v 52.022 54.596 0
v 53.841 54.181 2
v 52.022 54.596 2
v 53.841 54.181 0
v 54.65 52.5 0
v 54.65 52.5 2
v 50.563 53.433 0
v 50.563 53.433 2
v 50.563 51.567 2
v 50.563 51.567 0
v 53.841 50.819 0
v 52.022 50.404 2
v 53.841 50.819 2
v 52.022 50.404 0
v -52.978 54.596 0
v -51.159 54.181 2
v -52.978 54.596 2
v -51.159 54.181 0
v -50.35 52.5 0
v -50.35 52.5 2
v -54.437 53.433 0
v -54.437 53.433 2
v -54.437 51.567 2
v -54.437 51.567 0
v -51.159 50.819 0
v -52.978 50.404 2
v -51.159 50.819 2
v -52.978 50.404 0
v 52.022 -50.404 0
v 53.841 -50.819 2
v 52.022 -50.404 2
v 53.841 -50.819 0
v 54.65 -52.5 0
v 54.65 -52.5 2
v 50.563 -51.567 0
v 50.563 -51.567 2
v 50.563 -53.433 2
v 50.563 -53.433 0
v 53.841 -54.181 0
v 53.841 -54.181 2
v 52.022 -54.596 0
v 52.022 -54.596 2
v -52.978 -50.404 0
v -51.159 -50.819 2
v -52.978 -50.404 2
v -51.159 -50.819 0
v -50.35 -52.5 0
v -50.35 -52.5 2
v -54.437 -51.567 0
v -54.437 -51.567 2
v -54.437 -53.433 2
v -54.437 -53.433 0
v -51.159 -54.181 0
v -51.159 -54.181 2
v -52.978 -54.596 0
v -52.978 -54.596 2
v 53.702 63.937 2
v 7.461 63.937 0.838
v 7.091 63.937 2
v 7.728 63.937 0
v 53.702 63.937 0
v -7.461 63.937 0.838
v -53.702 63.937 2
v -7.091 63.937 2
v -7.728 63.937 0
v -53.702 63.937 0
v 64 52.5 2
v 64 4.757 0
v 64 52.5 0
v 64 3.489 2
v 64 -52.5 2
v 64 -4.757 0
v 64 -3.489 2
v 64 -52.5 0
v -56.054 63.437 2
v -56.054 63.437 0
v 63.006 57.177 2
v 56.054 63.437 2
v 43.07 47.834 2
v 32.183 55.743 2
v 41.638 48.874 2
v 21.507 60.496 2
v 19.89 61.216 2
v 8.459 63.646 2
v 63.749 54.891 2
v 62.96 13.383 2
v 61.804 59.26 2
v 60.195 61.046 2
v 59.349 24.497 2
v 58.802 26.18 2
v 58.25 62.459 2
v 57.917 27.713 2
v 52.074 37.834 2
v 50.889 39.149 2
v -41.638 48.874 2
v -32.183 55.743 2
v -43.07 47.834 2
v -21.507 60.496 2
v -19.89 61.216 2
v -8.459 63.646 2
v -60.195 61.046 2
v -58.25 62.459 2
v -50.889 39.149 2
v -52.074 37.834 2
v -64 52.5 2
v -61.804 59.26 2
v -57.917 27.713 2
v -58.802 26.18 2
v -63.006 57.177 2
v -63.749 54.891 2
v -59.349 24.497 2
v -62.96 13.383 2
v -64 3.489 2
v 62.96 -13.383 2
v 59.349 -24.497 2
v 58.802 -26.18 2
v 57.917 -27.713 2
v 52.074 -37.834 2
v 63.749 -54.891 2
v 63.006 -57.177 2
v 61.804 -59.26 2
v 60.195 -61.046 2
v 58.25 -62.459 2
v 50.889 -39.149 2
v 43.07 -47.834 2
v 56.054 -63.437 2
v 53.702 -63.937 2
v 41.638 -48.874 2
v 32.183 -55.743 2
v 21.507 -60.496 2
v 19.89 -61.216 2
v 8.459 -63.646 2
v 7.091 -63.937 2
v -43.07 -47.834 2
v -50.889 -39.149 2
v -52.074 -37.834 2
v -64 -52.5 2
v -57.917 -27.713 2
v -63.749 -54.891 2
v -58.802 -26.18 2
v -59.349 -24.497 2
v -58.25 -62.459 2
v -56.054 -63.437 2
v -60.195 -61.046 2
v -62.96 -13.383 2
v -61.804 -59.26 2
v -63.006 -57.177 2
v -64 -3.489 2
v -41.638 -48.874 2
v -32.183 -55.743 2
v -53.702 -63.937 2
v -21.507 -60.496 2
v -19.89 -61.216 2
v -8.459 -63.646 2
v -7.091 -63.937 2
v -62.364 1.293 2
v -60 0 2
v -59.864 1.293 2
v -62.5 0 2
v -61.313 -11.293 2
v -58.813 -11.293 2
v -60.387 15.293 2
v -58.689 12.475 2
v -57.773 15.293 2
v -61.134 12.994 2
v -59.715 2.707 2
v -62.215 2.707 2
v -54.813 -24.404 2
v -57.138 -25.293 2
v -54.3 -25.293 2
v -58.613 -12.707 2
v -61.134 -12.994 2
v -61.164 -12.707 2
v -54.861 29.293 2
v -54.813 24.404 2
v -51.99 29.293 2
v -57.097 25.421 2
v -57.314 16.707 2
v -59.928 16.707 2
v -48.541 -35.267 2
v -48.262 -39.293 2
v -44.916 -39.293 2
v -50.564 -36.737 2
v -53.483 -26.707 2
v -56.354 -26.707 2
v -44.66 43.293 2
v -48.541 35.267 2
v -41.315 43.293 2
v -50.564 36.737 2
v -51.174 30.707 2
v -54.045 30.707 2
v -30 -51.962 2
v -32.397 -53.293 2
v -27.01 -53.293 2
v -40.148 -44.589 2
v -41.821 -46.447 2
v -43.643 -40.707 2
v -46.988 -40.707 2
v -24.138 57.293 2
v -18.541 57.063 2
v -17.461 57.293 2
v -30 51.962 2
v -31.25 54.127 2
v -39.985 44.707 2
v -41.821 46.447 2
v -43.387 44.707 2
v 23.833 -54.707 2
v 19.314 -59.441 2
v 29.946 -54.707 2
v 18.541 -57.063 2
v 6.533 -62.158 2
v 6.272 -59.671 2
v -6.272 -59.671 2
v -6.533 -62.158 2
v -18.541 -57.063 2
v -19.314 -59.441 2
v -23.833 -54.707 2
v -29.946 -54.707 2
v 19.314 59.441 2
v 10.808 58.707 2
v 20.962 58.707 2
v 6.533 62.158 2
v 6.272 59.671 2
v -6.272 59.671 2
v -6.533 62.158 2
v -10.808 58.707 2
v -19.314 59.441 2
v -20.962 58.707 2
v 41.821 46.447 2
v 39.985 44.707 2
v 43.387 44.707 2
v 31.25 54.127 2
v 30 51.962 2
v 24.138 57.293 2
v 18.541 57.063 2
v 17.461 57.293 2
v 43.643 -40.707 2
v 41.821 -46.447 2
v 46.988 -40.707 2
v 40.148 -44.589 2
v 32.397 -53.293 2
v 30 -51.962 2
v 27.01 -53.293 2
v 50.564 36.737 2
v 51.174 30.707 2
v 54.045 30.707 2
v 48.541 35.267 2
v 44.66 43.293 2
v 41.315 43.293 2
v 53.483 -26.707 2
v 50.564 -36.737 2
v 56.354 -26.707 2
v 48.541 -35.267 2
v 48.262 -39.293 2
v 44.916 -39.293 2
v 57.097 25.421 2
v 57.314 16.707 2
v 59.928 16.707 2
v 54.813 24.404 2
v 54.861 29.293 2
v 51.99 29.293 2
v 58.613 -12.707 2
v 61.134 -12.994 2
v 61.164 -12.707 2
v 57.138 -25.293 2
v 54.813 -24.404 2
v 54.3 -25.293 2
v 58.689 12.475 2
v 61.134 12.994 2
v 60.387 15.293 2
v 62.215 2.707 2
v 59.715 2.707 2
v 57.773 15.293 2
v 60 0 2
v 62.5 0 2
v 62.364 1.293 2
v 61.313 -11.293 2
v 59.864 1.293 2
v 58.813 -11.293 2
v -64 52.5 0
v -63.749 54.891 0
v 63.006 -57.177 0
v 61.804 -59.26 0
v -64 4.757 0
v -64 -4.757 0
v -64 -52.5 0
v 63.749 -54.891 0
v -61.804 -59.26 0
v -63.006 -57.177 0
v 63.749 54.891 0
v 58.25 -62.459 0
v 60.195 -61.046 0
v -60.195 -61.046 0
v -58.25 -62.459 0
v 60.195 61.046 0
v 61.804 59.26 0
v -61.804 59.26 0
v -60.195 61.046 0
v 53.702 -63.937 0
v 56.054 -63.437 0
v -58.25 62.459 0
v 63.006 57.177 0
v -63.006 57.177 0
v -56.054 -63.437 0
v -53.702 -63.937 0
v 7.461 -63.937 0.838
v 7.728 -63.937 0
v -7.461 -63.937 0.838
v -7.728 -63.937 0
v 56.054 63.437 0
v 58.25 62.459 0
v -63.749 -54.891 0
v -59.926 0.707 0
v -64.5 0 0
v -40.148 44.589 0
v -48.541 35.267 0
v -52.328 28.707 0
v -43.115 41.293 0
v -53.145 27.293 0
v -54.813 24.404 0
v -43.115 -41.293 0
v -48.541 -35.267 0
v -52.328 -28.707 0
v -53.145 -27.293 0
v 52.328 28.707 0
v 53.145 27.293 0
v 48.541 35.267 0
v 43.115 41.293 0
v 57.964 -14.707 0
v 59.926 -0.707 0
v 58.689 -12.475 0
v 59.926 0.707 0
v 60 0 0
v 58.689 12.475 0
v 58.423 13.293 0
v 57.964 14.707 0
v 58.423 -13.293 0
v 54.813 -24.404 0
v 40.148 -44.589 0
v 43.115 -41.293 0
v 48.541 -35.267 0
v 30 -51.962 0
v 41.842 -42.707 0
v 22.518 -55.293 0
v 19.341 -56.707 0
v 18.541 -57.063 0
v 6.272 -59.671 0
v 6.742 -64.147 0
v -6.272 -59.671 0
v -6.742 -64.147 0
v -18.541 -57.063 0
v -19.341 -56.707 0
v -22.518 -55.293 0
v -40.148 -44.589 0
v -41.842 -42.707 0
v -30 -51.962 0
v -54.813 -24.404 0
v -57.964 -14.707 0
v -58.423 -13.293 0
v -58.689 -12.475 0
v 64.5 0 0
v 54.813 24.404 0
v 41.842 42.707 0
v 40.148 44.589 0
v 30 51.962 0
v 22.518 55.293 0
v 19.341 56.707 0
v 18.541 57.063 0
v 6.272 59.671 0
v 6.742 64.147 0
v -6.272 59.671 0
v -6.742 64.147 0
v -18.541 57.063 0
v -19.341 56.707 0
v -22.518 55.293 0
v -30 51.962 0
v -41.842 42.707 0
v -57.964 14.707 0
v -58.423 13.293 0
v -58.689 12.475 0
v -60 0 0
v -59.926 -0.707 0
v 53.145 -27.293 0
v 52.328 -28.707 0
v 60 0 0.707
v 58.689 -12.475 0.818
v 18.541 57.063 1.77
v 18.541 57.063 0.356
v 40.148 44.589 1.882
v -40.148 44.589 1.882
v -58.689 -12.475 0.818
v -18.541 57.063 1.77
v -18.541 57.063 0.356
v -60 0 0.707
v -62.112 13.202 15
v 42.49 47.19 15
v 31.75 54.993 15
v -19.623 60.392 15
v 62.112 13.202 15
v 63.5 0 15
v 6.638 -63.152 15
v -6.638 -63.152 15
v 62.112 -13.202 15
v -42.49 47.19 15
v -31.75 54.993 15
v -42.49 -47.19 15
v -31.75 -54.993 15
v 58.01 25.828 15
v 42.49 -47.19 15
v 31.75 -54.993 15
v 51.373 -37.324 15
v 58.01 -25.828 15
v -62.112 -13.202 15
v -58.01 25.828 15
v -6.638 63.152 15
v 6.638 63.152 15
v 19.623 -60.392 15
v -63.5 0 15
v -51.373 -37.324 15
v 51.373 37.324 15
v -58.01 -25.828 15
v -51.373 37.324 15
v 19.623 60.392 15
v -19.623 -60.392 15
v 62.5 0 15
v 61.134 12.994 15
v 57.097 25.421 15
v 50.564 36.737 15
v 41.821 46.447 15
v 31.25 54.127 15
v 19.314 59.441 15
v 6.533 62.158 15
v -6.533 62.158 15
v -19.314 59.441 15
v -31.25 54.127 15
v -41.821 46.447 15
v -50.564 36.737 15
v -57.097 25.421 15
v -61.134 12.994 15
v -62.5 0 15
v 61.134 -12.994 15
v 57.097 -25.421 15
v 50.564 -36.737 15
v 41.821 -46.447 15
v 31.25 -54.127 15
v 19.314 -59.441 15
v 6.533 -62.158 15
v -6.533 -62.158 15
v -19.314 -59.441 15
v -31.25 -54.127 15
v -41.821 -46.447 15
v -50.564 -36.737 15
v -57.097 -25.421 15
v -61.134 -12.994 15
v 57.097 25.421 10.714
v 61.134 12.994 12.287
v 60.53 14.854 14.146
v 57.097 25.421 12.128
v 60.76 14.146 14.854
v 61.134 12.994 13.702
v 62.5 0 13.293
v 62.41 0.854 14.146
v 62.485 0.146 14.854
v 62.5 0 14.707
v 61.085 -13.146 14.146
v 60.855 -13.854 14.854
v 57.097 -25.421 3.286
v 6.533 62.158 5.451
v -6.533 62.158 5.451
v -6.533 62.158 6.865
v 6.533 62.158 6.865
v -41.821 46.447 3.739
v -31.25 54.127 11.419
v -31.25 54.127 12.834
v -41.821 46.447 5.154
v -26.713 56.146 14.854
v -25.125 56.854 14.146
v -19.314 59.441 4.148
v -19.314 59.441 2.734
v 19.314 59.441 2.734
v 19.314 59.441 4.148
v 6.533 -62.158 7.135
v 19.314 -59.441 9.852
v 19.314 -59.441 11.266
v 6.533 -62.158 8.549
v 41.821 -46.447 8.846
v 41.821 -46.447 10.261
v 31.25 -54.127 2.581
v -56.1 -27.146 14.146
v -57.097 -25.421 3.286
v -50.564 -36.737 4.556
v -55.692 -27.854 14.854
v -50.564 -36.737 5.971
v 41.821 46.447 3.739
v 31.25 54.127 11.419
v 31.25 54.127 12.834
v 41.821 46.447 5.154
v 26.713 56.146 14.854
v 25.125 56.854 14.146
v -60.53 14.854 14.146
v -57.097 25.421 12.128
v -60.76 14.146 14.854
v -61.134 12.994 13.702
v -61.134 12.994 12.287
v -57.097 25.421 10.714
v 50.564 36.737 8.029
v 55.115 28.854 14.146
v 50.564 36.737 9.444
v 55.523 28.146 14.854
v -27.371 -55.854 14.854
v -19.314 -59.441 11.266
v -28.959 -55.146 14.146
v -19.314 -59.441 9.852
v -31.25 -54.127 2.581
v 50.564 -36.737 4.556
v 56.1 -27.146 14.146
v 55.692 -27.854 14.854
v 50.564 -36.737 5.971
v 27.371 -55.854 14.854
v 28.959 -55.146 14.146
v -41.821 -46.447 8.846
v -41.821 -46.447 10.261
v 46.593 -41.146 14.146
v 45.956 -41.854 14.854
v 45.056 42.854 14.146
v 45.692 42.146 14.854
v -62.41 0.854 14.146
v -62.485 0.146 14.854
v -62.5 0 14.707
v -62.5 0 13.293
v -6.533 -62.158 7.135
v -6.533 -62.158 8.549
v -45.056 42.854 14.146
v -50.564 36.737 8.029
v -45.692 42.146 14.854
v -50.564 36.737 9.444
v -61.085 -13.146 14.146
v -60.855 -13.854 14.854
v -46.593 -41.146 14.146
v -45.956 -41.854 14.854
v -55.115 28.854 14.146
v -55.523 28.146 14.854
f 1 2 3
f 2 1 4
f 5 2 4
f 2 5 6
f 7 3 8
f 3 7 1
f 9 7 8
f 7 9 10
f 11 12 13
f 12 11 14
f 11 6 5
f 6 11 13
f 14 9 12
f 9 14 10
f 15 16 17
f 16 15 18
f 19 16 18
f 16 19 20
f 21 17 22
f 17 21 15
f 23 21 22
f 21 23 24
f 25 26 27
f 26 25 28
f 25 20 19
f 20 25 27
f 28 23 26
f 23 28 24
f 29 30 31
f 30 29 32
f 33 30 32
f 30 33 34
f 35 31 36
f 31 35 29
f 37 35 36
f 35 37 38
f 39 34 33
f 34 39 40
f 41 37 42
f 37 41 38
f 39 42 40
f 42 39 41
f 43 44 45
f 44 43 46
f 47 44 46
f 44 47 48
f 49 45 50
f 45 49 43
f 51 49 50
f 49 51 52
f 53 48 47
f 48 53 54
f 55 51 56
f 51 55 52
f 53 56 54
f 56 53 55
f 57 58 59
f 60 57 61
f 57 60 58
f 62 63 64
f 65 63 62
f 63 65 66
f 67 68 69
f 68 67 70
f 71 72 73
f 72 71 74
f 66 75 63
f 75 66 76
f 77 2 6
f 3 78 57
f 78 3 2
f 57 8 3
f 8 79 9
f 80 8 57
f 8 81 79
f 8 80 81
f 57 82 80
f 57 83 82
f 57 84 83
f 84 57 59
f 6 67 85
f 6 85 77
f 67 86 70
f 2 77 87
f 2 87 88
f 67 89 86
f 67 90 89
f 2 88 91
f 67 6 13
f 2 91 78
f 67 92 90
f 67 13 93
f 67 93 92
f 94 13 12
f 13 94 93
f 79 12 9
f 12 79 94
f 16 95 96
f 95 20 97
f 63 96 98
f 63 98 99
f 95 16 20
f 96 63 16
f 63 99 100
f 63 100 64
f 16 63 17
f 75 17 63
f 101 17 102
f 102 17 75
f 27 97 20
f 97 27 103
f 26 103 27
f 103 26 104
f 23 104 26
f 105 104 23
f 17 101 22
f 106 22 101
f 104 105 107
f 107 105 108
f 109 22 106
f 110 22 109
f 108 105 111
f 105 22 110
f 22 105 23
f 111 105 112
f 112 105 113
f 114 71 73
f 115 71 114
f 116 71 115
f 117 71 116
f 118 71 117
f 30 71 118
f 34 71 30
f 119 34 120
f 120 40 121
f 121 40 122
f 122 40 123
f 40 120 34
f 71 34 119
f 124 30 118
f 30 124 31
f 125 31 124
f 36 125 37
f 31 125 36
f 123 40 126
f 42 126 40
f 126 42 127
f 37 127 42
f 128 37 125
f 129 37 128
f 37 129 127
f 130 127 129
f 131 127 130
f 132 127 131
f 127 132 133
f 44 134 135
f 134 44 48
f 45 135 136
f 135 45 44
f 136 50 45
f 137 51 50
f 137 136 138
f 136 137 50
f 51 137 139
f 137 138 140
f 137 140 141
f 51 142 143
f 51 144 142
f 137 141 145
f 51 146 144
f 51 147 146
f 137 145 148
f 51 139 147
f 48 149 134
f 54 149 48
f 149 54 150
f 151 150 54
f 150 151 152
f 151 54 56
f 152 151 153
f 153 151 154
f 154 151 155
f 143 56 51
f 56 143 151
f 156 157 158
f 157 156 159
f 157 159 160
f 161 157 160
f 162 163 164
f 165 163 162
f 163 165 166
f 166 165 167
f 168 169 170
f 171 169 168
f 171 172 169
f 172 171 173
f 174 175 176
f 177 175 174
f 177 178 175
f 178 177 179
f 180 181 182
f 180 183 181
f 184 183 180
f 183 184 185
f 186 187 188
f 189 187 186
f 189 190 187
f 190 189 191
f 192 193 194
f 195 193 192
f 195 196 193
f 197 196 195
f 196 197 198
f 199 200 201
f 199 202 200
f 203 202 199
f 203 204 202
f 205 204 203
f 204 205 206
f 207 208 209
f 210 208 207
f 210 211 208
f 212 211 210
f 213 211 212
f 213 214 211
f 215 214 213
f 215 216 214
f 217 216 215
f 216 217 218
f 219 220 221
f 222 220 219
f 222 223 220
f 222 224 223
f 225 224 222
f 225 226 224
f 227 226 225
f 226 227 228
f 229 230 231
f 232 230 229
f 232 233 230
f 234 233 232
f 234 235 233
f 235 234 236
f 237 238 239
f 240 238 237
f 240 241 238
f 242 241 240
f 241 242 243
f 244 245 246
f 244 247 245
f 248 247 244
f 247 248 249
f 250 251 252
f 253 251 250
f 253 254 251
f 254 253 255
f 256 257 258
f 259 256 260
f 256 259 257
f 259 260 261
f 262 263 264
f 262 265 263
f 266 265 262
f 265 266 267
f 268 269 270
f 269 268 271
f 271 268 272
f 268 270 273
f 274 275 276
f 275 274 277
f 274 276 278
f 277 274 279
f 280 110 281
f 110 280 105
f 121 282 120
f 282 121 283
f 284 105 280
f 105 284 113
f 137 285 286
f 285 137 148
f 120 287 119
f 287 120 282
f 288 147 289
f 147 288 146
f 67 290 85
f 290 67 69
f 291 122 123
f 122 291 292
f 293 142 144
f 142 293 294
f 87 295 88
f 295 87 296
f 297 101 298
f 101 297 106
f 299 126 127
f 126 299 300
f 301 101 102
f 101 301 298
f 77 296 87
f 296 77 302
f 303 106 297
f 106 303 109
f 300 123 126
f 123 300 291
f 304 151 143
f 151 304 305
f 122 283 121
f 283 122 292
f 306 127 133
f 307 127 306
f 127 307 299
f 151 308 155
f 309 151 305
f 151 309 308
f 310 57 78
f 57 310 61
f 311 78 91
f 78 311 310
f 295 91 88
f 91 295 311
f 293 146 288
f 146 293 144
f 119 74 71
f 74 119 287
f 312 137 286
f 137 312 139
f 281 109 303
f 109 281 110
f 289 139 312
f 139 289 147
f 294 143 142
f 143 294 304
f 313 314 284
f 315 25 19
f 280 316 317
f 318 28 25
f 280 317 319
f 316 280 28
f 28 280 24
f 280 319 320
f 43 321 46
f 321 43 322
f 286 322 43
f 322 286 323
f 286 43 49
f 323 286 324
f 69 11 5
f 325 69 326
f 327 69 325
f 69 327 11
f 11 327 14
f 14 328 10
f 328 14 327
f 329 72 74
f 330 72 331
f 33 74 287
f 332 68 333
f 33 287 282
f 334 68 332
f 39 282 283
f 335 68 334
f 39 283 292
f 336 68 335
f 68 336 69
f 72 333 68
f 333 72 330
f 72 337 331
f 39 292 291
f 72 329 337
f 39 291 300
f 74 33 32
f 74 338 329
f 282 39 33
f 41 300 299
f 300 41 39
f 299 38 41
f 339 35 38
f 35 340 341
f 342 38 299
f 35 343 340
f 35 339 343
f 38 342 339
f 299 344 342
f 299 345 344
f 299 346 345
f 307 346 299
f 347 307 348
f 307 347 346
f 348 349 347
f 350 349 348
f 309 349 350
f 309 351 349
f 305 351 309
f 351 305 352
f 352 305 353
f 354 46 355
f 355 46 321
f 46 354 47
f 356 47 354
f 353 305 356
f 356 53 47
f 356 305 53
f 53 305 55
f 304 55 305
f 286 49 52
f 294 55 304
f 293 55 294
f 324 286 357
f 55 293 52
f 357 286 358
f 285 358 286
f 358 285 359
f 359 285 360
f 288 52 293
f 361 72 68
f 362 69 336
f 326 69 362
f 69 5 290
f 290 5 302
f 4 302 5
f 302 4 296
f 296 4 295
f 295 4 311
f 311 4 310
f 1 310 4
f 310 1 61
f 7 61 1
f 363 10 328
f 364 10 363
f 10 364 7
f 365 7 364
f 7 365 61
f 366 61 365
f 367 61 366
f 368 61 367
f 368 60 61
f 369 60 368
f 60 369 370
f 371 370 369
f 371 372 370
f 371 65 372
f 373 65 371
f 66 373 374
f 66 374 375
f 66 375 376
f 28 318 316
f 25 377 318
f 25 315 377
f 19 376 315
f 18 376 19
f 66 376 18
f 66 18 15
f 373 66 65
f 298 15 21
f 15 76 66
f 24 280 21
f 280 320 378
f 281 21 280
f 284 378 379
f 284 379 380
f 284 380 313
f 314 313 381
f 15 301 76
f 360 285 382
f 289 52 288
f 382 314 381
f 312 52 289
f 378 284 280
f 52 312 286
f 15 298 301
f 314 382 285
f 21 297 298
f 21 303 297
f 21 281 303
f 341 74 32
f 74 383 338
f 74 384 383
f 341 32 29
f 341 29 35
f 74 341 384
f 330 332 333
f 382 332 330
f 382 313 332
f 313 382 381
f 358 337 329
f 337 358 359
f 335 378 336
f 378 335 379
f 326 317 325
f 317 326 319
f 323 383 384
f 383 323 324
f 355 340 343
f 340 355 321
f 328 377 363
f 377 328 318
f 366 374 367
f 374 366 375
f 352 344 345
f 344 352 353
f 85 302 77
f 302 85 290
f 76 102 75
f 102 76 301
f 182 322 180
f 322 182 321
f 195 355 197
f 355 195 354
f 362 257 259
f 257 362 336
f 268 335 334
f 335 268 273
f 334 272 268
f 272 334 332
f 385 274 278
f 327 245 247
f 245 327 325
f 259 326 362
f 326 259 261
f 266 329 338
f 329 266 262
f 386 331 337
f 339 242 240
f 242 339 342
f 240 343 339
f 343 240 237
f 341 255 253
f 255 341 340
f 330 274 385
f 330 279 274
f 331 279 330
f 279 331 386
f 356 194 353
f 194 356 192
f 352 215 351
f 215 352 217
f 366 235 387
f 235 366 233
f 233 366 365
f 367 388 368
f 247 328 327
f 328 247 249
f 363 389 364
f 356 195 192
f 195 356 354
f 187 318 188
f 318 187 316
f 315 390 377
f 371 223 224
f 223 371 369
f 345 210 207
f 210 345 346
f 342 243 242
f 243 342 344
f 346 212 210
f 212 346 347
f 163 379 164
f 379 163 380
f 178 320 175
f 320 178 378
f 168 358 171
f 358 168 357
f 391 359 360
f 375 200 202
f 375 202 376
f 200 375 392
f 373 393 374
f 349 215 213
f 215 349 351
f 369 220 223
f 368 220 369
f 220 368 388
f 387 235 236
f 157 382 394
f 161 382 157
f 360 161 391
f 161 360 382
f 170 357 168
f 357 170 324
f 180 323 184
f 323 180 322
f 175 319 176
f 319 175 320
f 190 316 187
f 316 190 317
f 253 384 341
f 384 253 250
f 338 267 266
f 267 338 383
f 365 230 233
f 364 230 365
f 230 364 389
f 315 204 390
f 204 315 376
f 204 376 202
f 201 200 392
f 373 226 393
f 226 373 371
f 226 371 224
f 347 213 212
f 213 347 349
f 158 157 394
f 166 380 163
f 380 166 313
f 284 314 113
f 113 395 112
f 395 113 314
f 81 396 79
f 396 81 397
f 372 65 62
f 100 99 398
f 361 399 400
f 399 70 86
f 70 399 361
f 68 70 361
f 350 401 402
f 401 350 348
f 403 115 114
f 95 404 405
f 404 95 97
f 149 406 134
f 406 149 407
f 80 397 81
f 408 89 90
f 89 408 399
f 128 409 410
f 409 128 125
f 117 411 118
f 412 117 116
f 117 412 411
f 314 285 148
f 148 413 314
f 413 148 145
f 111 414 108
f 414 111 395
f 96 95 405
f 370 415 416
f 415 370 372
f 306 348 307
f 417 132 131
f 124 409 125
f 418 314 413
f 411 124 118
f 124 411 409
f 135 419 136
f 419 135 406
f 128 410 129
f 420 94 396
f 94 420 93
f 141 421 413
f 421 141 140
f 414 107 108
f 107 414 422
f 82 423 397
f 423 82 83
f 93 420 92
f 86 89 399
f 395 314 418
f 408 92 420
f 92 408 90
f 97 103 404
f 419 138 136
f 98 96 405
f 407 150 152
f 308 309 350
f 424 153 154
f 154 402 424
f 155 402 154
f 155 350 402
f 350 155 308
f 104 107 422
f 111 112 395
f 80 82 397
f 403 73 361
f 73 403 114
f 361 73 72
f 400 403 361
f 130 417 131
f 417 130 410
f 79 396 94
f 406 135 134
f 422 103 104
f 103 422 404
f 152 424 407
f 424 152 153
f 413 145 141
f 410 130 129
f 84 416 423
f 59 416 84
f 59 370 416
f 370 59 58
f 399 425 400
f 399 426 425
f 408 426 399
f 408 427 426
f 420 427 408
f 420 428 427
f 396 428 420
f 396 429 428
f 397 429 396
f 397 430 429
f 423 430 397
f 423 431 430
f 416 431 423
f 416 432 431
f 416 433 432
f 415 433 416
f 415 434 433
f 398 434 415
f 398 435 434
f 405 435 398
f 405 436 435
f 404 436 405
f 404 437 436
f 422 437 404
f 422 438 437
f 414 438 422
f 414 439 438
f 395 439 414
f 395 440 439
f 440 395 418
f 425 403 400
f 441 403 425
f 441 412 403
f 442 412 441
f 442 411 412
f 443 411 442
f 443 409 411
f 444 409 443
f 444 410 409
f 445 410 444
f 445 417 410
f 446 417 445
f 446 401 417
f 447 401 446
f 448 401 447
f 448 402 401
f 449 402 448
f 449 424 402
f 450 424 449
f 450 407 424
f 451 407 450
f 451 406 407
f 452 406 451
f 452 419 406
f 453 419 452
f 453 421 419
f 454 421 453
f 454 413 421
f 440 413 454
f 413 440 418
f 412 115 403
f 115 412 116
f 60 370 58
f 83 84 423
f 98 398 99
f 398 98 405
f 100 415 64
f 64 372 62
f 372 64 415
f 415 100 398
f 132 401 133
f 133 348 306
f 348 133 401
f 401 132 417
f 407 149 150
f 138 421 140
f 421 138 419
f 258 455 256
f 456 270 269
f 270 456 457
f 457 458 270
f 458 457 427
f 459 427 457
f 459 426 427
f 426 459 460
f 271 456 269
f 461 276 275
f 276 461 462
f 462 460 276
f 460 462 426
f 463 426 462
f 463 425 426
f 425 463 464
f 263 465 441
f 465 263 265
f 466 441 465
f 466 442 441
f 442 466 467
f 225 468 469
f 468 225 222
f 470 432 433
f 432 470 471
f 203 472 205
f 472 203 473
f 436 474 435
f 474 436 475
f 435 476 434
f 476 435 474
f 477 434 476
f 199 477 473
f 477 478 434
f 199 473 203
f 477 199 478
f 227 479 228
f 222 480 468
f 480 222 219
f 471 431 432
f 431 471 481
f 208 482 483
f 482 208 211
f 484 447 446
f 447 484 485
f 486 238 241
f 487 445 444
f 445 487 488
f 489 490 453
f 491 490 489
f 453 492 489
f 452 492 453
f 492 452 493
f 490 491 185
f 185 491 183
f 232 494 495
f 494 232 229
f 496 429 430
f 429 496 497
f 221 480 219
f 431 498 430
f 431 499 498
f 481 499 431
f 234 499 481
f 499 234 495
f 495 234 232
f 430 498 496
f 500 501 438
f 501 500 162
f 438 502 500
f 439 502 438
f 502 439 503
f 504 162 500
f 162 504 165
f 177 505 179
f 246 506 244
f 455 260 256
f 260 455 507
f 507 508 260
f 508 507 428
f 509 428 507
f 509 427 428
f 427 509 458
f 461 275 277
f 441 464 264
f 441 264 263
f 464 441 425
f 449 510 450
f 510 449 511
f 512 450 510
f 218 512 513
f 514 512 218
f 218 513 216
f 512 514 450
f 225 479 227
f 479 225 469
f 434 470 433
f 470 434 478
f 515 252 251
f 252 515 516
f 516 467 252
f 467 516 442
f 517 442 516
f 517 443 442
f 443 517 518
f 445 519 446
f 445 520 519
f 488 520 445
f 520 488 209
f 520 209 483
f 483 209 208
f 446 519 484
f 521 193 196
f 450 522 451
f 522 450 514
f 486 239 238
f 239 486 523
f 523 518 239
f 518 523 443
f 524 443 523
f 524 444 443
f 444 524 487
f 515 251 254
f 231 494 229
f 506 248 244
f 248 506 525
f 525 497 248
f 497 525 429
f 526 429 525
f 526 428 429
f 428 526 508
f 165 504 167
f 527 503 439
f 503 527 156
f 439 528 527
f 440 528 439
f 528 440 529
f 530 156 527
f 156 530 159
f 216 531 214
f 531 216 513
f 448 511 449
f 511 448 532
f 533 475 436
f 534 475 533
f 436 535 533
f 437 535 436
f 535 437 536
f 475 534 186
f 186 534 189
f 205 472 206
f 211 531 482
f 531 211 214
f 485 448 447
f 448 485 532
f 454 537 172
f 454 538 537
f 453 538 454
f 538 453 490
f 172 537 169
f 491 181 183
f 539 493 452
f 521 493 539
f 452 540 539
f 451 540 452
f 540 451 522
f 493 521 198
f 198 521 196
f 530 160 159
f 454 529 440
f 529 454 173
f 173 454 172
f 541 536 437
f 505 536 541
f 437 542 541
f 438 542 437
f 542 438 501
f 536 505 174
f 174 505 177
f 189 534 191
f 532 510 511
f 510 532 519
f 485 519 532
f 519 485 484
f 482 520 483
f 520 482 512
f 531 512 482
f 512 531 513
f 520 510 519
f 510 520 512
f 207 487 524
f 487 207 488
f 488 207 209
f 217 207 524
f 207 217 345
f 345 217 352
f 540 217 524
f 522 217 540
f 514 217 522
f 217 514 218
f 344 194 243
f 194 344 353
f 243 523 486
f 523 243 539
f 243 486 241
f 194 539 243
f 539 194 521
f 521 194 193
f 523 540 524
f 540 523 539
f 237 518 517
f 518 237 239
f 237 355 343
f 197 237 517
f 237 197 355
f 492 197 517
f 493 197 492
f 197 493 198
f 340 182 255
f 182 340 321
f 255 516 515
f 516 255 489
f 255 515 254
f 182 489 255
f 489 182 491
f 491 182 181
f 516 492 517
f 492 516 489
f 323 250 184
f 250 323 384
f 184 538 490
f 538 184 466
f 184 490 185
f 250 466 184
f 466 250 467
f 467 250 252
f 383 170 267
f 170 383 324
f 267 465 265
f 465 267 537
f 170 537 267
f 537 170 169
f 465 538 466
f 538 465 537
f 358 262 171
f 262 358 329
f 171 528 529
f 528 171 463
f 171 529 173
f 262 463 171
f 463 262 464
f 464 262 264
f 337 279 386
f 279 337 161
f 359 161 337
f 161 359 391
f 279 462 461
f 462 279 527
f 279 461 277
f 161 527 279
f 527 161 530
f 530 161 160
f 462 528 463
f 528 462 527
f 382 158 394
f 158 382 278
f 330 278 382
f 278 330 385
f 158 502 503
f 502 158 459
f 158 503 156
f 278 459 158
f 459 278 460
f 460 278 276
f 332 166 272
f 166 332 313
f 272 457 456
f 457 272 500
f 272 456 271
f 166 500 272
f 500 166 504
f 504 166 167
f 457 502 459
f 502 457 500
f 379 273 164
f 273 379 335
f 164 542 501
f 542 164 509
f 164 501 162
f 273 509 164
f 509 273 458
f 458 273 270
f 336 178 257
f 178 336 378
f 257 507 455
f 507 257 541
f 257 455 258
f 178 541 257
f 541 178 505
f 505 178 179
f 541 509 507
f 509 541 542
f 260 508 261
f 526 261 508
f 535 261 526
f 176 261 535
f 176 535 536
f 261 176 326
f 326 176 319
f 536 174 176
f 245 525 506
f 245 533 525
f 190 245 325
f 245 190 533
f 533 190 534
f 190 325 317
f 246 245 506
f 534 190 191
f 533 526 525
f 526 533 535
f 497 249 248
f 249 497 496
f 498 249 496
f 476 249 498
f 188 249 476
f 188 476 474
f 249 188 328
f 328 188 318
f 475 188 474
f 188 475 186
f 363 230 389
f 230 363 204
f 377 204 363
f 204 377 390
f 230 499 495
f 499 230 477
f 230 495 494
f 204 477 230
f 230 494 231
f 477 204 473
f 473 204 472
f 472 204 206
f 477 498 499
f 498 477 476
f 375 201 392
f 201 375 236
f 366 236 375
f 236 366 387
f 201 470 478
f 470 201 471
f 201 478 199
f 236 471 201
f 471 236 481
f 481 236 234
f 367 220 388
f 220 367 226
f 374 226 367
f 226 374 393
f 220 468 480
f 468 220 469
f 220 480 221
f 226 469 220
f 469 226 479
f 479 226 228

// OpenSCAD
// file: constants.scad
fan_mounting_hole_spacing = 105;
fan_mounting_hole_diameter = 4.3;  // slightly oversized for #8, will probably need drilling anyway
fan_frame_width = 120;

module frame_hole_negative(h=1000) {
    frame_hole_pattern() cylinder(d=fan_mounting_hole_diameter, h=h, center=true);
}

module frame_hole_pattern() {
    r = fan_mounting_hole_spacing / 2;
    translate([ r,  r, 0]) children();
    translate([-r,  r, 0]) children();
    translate([ r, -r, 0]) children();
    translate([-r, -r, 0]) children();
}
// main file
include <constants.scad>;

// must be at least 7.5 mm to allow for the difference between hole pattern and frame size, but we also want to fit over a bad hole
roundover_and_margin = 7.5 + 4;
plate_thick = 2;

screen_frame_thick = 1;
screen_slat_thick = 1;
screen_across = fan_frame_width + 5;
screen_depth = 15;
screen_slat_spacing = 14;
screen_slat_phase = 0;

epsilon = 0.1;

translate([0, 0, plate_thick / 2])
difference() {
    minkowski() {
        // each of these has half height so the sum is full height
        cylinder(r=roundover_and_margin, h=plate_thick / 2, center=true);
        cube([fan_mounting_hole_spacing, fan_mounting_hole_spacing, plate_thick / 2], center=true);
    }
    
    cylinder(r=fan_frame_width / 2, h=plate_thick * 2, center=true);
    
    frame_hole_negative();
}

// frame of louver
translate(plate_thick - epsilon)
screen();

module screen() {
    translate([0, 0, screen_depth / 2])
    difference() {
      cylinder(
        d1=screen_across + screen_frame_thick * 4,
        d2=screen_across + screen_frame_thick * 2,
        h=screen_depth,
        center=true);
      cylinder(d=screen_across, h=screen_depth + epsilon, center=true);
    }

    difference() {
        intersection() {
            for (i = [-5:4]) {
                diag = isosceles_hypotenuse(screen_depth * 2) - isosceles_hypotenuse(screen_slat_thick);

                translate([0, screen_slat_phase + screen_slat_spacing * i, 0])
                rotate([45, 0, 0])
                cube([screen_across, diag, screen_slat_thick], center=true);
            }
            cylinder(d=screen_across + epsilon, h=1000, center=true);
        }
        
        // cut slats off at base for support
        halfneg = -(screen_across + epsilon) / 2;
        translate([halfneg, halfneg, -screen_depth])
        cube([screen_across + epsilon, screen_across + epsilon, screen_depth]);
    }
}

function isosceles_hypotenuse(d) = sqrt(pow(d, 2) * 2);
